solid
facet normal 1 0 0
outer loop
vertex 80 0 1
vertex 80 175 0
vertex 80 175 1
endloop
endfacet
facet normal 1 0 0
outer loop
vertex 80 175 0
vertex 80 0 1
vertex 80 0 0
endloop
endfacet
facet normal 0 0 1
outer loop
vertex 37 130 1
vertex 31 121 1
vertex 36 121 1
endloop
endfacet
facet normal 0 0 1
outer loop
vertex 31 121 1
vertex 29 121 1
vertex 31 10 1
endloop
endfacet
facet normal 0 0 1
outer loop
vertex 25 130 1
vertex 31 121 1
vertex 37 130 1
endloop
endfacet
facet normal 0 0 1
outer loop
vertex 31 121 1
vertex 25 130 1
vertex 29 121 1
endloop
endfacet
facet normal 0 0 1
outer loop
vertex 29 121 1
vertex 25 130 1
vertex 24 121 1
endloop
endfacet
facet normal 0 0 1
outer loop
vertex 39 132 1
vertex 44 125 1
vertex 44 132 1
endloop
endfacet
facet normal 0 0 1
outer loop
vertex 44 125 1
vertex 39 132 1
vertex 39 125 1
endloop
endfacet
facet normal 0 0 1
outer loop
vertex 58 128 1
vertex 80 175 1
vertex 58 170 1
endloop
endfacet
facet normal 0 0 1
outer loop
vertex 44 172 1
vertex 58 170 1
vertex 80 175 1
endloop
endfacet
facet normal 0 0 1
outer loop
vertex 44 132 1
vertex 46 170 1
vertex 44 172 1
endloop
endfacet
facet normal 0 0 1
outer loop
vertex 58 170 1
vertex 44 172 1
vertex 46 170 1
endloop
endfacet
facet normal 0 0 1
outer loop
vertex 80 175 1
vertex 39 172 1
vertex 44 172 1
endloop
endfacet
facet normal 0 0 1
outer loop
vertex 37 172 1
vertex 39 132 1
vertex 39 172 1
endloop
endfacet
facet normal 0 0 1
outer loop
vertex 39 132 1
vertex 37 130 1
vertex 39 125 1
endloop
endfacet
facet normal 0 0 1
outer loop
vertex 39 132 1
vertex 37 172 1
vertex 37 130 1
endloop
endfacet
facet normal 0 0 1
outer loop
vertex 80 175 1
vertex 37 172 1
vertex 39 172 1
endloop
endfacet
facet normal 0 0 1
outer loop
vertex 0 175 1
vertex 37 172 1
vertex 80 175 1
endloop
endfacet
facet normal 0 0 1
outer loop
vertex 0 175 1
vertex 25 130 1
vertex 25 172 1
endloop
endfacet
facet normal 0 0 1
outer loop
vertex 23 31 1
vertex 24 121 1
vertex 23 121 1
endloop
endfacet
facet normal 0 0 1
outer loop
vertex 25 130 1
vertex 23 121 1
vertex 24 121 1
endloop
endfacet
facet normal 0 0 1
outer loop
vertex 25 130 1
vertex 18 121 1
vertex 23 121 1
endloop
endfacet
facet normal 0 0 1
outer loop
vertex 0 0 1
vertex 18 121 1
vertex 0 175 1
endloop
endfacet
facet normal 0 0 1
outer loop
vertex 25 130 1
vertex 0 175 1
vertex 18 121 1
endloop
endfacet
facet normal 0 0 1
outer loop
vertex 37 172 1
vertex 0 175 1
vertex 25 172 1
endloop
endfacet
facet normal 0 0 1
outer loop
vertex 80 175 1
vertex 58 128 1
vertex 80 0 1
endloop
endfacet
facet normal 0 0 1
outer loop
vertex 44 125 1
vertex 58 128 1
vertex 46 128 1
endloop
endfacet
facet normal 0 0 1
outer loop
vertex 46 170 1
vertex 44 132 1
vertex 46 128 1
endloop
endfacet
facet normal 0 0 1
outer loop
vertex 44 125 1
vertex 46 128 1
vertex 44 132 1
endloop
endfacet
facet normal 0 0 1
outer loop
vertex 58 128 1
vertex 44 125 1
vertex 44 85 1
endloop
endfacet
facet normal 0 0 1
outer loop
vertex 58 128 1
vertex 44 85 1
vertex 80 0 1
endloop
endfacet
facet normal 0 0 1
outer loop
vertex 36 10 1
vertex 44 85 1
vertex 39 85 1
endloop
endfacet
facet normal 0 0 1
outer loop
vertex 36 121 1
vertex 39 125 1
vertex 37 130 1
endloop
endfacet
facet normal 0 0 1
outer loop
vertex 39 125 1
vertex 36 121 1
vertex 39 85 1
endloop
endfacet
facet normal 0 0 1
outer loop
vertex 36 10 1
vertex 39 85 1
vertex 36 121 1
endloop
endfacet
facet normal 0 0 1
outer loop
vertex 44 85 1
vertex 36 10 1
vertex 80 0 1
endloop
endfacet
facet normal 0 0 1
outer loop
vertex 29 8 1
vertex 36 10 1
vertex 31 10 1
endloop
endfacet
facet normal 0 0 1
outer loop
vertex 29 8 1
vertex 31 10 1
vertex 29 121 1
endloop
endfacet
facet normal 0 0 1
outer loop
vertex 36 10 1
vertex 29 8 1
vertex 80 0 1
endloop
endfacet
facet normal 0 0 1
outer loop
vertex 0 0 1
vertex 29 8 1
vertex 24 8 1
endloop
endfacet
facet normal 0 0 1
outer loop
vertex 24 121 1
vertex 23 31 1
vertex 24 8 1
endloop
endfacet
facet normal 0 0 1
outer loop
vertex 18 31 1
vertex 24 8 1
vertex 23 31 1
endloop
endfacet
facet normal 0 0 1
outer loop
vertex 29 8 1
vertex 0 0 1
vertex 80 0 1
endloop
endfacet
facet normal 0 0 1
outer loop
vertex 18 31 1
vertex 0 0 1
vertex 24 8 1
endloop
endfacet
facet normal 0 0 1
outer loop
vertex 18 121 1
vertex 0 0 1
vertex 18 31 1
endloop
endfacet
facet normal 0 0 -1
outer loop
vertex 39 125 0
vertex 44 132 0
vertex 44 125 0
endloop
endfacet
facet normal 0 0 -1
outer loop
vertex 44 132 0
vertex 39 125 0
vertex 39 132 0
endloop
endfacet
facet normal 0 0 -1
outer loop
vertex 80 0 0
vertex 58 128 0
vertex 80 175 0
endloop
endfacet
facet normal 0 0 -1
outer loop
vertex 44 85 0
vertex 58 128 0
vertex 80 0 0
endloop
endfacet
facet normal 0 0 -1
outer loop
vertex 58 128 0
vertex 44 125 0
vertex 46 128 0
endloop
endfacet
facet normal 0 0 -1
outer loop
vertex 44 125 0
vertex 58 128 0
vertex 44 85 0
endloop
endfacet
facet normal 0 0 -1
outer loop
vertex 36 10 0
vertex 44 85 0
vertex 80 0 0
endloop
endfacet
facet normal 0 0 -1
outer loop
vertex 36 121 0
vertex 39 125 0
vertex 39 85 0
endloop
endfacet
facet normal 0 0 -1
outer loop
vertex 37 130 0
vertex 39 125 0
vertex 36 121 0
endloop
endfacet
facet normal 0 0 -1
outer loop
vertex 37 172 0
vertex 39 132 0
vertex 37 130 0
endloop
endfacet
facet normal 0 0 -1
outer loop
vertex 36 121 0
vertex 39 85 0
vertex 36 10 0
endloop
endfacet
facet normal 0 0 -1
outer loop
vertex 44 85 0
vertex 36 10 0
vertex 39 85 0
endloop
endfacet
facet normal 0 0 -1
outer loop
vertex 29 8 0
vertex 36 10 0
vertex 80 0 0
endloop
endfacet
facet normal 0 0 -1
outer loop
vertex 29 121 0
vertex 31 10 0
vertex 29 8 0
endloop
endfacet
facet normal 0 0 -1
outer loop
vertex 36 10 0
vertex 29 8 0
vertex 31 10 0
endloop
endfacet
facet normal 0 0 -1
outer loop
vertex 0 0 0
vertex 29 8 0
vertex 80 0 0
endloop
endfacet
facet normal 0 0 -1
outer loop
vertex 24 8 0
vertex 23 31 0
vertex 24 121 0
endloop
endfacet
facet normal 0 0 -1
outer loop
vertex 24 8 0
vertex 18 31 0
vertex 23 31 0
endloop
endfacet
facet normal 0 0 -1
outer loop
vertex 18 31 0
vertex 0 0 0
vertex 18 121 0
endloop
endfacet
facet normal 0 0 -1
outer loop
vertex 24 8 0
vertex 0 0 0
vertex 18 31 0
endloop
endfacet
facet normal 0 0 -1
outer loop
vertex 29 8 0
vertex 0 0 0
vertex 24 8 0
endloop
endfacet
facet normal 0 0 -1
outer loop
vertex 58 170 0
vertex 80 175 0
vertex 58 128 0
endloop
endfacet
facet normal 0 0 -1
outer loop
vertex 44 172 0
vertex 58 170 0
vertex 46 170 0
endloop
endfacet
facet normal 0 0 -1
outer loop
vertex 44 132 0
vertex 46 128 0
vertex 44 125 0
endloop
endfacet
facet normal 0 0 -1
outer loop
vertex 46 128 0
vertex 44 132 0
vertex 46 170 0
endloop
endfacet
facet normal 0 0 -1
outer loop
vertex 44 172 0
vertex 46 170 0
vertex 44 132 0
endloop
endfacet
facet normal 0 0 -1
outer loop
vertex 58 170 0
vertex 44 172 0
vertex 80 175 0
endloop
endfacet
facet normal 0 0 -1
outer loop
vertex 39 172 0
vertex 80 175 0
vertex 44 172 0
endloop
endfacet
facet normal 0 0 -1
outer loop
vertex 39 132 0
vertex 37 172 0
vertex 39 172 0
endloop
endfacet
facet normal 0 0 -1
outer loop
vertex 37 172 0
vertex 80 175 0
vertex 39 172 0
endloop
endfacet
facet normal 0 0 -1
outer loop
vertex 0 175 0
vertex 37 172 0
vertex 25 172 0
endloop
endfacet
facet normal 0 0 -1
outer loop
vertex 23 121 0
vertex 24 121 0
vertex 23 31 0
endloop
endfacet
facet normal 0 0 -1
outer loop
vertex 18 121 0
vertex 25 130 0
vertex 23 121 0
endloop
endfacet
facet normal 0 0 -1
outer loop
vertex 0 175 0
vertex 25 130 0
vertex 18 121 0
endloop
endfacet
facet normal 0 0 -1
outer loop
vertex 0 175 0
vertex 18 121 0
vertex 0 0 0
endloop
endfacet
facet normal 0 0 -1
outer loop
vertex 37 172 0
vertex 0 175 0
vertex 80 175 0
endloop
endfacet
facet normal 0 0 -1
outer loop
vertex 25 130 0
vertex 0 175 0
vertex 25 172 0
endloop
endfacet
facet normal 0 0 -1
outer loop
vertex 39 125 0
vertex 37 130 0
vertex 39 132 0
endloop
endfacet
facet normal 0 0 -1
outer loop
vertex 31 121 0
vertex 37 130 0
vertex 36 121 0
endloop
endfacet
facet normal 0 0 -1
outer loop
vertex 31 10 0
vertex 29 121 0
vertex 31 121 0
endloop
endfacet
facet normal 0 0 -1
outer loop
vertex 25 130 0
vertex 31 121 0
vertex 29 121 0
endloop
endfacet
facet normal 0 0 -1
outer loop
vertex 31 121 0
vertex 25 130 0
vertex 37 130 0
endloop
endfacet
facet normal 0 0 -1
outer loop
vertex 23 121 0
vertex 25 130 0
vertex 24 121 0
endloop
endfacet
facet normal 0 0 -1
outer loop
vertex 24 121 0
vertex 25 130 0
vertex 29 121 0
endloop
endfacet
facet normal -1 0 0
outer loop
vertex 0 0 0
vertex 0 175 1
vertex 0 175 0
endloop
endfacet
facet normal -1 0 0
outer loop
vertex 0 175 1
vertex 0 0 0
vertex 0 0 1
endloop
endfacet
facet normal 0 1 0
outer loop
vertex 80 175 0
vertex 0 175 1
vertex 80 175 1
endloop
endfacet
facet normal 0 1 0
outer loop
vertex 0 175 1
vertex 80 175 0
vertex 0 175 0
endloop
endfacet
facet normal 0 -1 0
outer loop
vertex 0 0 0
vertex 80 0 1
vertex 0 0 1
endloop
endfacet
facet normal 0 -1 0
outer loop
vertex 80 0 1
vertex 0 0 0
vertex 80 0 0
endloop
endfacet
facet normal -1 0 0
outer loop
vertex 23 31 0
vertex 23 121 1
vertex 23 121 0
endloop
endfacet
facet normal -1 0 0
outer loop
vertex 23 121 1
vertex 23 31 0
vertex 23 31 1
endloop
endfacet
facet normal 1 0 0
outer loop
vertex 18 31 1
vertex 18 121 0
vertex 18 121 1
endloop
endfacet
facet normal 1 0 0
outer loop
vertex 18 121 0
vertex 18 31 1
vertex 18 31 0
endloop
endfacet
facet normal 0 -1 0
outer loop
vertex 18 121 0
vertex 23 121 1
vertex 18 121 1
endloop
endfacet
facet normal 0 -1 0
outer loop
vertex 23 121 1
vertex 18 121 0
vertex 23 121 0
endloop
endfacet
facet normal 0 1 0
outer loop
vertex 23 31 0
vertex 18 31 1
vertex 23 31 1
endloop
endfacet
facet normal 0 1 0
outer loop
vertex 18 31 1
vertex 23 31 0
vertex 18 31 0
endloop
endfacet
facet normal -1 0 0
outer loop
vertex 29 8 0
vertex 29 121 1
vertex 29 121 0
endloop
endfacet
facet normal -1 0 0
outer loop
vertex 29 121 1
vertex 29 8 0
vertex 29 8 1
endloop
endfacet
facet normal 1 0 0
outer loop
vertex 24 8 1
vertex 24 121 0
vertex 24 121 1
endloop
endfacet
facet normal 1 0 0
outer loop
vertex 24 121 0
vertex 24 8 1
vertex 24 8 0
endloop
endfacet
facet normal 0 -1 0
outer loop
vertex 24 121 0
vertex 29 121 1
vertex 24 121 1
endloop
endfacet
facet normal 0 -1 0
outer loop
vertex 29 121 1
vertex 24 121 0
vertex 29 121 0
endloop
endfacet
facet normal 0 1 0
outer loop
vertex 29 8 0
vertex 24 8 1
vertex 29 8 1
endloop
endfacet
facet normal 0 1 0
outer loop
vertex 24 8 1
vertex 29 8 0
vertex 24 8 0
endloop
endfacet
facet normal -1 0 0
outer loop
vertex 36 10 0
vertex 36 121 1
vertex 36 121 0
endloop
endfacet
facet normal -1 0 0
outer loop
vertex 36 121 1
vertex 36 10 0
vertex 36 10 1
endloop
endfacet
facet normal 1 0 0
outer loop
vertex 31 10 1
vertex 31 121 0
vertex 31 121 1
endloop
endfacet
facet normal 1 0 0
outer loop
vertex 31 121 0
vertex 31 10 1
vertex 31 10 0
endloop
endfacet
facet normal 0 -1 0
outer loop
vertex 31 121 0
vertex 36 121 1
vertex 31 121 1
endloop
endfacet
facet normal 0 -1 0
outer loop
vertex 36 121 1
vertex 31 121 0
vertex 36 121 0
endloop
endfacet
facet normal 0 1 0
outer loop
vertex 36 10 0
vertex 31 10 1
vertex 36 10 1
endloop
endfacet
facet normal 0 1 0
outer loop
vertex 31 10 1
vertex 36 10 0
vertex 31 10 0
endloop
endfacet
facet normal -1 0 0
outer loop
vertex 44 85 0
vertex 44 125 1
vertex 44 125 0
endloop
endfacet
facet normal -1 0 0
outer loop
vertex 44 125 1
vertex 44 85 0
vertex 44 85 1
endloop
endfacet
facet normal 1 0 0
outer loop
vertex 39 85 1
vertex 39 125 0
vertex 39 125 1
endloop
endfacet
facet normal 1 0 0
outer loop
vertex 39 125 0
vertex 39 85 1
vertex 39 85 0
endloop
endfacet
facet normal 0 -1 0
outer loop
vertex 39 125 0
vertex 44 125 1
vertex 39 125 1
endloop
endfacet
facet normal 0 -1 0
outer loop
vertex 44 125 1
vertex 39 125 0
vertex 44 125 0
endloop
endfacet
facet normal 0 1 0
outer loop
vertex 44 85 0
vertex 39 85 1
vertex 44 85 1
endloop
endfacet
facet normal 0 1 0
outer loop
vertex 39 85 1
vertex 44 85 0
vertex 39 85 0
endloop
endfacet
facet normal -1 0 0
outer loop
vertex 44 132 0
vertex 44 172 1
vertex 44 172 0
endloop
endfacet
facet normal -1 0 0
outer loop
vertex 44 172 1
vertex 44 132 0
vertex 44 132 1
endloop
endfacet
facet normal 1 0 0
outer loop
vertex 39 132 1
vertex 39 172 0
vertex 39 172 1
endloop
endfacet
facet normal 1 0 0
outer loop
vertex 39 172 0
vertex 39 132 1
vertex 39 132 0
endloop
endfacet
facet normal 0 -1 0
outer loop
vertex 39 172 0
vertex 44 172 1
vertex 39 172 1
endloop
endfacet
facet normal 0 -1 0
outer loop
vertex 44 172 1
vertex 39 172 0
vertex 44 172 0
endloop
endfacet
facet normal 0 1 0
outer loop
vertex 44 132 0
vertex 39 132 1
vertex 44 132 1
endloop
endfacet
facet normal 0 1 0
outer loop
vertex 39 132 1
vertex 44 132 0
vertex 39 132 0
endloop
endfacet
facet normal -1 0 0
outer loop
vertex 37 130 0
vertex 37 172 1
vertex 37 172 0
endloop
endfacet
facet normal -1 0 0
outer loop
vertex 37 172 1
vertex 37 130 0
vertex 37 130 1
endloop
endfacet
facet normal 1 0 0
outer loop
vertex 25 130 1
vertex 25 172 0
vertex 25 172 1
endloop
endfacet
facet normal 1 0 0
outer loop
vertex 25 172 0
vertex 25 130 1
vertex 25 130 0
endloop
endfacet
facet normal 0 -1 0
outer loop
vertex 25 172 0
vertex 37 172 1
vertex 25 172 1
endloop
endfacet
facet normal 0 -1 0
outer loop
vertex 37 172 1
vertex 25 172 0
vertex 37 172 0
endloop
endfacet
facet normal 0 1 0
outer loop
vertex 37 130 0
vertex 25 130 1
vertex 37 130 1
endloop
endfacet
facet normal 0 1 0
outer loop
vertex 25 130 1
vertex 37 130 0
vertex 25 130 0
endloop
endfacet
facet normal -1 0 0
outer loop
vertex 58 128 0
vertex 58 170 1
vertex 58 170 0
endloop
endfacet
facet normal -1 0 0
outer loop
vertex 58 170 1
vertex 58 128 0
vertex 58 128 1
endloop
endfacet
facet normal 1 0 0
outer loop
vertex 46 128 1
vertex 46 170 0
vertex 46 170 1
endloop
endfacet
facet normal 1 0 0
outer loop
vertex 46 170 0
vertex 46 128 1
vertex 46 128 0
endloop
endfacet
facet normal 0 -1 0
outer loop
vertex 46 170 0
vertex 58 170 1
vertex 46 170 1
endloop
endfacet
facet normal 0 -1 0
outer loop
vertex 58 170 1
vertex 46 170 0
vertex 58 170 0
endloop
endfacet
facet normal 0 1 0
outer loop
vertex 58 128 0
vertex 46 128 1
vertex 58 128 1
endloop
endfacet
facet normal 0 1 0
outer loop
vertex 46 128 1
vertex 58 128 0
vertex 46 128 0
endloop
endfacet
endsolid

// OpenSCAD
// guide cheque LCL version 0 by GAU for SAAAIS 34&30 //

difference()
	{


// plateau
cube([80,175,1]);

// case 1 montant 1ere ligne
translate([18,31,-0.5])
cube([5,90,4]);

// case 2 montant 2eme ligne
translate([24,8,-0.5])
cube([5,113,4]);

// case 3 ordre
translate([31,10,-0.5])
cube([5,111,4]);

// case 4 fais à
translate([39,85,-0.5])
cube([5,40,4]);

// case 5 fais le
translate([39,132,-0.5])
cube([5,40,4]);

// case 6 montant chiffres
translate([25,130,-0.5])
cube([12,42,4]);

// case 5 signature
translate([46,128,-0.5])
cube([12,42,4]);
}
